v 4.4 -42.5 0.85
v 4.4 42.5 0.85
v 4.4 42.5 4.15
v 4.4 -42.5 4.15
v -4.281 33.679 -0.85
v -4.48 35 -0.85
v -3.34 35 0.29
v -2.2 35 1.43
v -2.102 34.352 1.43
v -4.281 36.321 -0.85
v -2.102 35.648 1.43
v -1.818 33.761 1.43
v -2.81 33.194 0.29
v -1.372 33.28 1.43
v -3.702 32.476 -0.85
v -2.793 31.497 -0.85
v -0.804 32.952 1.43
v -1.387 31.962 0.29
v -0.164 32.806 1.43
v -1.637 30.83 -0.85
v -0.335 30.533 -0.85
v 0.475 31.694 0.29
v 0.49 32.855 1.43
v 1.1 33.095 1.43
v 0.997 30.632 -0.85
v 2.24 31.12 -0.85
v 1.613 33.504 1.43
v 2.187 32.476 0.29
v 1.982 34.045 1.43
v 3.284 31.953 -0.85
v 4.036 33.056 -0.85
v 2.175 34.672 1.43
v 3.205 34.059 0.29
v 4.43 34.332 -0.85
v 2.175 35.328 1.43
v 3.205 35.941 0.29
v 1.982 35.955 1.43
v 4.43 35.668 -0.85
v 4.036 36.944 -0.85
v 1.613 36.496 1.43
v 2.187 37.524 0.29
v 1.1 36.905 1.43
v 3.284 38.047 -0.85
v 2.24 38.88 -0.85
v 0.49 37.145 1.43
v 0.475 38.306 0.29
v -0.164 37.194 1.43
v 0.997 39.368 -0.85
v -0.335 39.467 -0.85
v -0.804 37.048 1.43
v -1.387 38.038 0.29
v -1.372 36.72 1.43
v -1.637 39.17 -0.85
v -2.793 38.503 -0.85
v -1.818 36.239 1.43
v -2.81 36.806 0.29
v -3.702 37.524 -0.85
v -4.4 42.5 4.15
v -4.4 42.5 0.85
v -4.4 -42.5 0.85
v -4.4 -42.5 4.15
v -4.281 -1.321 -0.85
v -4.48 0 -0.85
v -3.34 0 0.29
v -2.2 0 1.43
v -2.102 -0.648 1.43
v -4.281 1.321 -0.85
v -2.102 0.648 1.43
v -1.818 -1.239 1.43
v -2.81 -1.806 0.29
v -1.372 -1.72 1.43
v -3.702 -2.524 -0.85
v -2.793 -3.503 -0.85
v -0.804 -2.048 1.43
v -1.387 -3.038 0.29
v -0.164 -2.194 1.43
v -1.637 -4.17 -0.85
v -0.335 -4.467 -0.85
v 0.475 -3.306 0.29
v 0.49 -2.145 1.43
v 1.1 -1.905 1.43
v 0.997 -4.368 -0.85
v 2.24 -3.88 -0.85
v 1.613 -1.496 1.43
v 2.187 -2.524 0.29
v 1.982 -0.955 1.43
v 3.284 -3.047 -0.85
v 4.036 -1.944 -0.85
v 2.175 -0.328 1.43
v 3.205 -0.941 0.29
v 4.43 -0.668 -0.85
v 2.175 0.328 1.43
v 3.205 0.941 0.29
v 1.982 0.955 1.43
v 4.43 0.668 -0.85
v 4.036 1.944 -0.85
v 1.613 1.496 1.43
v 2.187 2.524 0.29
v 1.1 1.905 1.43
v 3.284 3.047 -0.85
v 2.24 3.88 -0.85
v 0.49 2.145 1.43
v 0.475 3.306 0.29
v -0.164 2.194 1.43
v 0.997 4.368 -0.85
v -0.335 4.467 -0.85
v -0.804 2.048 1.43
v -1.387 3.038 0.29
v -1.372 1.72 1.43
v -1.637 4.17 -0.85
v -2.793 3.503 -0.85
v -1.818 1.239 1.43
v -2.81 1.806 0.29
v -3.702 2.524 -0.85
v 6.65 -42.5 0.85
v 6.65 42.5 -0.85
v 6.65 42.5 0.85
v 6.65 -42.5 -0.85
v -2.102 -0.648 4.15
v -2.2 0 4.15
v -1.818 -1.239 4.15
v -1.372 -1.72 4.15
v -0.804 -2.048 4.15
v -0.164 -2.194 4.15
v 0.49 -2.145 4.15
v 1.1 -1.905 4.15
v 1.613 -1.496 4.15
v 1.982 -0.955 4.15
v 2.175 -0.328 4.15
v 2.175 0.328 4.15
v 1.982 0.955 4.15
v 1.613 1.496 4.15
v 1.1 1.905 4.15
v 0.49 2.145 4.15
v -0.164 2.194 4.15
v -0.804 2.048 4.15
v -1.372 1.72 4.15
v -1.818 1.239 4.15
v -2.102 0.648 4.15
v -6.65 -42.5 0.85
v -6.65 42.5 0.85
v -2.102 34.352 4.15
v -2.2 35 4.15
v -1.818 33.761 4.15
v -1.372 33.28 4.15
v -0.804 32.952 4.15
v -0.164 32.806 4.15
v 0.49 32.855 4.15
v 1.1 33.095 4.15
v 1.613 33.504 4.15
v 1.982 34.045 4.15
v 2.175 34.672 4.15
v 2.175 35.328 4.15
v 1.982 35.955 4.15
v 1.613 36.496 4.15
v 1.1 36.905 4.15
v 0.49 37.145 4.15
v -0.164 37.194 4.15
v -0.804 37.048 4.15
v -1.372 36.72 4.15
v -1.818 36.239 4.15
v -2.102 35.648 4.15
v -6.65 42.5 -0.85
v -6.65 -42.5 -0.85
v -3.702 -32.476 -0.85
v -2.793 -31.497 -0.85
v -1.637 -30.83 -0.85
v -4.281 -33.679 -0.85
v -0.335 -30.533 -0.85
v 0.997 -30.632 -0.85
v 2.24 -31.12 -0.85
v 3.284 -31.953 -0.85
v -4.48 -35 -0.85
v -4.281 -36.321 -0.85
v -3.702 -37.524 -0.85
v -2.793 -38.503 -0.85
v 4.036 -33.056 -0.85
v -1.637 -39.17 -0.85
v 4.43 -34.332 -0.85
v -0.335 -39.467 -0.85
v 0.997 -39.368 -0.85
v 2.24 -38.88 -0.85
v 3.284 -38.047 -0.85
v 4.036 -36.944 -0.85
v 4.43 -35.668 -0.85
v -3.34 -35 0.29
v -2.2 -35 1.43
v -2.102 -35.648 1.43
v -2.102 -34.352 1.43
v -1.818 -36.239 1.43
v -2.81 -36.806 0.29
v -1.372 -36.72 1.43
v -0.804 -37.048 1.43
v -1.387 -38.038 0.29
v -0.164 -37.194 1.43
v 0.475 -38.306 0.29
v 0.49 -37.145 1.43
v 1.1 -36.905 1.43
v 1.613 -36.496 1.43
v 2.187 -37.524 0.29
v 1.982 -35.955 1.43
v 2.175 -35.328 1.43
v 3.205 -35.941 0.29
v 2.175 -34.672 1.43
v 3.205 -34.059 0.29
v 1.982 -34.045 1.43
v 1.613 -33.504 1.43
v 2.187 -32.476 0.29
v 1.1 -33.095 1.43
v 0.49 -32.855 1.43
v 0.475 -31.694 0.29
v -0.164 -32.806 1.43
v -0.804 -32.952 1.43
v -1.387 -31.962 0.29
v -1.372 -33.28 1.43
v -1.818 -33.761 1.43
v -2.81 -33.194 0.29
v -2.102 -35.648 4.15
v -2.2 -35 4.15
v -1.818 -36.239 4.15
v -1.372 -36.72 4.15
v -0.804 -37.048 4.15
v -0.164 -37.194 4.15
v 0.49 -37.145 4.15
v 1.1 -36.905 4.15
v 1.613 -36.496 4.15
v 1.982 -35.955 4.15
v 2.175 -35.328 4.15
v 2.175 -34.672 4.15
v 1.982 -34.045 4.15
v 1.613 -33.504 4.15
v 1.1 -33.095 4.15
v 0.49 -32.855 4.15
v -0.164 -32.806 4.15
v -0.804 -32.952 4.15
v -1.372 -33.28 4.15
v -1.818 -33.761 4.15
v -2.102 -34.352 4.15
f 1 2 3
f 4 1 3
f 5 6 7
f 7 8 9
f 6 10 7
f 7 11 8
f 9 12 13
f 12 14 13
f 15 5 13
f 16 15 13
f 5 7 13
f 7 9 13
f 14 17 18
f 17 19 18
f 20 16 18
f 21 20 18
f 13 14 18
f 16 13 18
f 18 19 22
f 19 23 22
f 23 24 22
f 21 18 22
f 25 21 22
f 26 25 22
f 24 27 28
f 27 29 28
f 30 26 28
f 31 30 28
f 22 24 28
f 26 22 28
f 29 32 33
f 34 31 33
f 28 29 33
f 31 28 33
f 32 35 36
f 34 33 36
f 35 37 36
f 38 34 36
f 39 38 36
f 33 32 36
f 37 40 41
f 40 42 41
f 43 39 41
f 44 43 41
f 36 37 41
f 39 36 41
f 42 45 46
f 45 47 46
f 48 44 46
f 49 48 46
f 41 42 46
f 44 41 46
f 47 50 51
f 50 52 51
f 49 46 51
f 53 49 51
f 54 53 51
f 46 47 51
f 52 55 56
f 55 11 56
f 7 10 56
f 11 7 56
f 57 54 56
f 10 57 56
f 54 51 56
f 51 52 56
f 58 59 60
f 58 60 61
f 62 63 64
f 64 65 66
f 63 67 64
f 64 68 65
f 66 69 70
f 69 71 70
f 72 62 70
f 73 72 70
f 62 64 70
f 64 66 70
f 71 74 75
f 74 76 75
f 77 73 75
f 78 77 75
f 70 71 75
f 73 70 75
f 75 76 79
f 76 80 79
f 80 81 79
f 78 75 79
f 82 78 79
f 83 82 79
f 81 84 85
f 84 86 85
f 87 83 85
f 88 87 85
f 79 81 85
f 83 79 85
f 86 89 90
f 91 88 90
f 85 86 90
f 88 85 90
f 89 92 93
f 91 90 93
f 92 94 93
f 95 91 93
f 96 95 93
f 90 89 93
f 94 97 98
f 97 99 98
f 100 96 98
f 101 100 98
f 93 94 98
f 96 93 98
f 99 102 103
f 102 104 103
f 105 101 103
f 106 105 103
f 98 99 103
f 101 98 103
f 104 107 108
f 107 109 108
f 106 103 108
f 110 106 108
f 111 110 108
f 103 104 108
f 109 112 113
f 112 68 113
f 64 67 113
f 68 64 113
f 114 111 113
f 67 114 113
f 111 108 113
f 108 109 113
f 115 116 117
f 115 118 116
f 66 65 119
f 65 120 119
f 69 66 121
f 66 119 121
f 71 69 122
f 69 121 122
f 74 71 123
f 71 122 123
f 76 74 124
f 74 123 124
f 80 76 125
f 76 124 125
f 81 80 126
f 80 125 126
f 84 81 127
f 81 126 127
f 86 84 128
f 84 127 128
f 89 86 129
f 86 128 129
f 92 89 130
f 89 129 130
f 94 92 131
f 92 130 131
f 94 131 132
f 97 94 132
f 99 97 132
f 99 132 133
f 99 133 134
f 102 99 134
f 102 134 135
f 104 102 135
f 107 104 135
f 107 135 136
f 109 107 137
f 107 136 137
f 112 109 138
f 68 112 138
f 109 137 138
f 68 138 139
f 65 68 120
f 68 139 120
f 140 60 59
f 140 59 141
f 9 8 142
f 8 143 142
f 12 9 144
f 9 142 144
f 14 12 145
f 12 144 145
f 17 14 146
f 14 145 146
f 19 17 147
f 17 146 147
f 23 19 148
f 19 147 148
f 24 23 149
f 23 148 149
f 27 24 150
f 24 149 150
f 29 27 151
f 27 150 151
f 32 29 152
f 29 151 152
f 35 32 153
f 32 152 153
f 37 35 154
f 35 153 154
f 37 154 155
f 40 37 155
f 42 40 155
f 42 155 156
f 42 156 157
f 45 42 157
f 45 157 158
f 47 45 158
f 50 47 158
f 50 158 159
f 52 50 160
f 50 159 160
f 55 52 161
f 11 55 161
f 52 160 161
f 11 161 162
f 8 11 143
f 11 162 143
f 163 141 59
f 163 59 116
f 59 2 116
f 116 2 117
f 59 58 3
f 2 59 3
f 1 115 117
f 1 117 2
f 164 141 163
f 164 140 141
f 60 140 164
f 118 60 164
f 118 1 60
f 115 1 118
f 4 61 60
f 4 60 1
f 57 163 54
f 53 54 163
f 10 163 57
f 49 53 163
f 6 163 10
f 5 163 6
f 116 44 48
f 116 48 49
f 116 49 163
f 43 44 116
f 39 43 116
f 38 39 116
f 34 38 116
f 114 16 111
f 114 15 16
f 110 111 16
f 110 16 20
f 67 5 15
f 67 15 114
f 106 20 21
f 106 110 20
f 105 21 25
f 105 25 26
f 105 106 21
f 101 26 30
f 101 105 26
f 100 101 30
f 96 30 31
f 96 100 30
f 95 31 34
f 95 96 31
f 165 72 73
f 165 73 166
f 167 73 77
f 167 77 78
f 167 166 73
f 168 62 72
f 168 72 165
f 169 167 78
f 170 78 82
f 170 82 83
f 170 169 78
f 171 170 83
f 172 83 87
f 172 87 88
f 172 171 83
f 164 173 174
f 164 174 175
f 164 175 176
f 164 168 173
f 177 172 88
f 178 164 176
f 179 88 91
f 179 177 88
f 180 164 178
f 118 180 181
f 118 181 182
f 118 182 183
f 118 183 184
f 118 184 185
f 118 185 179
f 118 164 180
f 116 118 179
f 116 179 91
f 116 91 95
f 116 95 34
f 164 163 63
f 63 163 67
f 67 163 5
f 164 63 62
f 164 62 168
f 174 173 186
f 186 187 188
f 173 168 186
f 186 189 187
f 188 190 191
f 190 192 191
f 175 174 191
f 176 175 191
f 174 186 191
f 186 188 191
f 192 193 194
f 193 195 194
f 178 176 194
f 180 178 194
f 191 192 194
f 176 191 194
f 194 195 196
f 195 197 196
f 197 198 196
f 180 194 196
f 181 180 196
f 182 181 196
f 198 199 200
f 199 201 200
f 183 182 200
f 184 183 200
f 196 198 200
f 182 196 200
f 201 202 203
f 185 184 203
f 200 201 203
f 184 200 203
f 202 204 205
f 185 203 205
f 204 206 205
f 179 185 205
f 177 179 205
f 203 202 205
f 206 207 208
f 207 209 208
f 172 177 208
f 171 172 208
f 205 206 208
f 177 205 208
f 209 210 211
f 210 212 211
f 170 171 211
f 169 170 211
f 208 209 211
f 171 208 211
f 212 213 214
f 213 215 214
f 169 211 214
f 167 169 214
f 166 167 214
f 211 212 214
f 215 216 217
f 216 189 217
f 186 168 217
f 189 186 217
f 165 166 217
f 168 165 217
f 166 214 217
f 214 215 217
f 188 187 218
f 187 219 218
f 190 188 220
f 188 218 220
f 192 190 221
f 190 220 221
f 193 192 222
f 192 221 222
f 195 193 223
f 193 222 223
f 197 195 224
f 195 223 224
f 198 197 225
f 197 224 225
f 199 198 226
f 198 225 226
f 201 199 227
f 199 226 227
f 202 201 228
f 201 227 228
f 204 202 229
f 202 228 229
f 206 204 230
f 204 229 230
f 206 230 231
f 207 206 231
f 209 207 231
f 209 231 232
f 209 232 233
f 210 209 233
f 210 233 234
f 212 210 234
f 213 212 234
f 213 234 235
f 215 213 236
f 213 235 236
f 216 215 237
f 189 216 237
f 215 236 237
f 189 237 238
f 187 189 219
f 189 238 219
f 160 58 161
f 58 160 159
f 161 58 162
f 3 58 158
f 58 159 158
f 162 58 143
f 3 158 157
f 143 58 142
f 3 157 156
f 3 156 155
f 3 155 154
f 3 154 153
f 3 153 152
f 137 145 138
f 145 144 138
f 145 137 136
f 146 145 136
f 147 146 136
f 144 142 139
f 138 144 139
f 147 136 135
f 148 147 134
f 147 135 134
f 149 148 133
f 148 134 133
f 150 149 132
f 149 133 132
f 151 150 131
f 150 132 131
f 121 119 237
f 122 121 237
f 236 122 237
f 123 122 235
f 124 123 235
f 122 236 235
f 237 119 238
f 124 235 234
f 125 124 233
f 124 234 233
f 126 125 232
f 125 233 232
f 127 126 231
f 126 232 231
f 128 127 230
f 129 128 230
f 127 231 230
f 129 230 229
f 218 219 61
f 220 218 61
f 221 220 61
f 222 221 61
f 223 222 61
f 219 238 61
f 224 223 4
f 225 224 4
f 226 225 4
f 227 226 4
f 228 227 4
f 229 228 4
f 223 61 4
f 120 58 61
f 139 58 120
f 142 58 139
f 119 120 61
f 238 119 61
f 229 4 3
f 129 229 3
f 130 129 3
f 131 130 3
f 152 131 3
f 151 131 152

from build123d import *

# Parameters (mm, degrees)
F0_W           = 8.8
F0_H           = 3.3
F1_DEPTH       = 42.5
F3_D           = 4.4
F3_CSINK_D     = 8.96
F3_CSINK_ANGLE = 90


with BuildPart() as f1:
    # F0 (on Front) → F1 (new body, symmetric)
    with BuildSketch(Plane.XZ):
        Polygon((6.65, -0.85), (6.65, 0.85), (4.4, 0.85), (-4.4, 0.85), (-6.65, 0.85), (-6.65, -0.85), align=None)
        with Locations((0, 2.5)):
            Rectangle(F0_W, F0_H)
    extrude(amount=F1_DEPTH, both=True)

    # F3 (through all)
    with Locations(Plane(origin=(0, 0, -0.85), x_dir=(1, 0, 0), z_dir=(0, 0, -1))):
        with Locations((0, -35), (0, 0), (0, 35)):
            CounterSinkHole(F3_D / 2, F3_CSINK_D / 2, counter_sink_angle=F3_CSINK_ANGLE)


solid = f1.part
